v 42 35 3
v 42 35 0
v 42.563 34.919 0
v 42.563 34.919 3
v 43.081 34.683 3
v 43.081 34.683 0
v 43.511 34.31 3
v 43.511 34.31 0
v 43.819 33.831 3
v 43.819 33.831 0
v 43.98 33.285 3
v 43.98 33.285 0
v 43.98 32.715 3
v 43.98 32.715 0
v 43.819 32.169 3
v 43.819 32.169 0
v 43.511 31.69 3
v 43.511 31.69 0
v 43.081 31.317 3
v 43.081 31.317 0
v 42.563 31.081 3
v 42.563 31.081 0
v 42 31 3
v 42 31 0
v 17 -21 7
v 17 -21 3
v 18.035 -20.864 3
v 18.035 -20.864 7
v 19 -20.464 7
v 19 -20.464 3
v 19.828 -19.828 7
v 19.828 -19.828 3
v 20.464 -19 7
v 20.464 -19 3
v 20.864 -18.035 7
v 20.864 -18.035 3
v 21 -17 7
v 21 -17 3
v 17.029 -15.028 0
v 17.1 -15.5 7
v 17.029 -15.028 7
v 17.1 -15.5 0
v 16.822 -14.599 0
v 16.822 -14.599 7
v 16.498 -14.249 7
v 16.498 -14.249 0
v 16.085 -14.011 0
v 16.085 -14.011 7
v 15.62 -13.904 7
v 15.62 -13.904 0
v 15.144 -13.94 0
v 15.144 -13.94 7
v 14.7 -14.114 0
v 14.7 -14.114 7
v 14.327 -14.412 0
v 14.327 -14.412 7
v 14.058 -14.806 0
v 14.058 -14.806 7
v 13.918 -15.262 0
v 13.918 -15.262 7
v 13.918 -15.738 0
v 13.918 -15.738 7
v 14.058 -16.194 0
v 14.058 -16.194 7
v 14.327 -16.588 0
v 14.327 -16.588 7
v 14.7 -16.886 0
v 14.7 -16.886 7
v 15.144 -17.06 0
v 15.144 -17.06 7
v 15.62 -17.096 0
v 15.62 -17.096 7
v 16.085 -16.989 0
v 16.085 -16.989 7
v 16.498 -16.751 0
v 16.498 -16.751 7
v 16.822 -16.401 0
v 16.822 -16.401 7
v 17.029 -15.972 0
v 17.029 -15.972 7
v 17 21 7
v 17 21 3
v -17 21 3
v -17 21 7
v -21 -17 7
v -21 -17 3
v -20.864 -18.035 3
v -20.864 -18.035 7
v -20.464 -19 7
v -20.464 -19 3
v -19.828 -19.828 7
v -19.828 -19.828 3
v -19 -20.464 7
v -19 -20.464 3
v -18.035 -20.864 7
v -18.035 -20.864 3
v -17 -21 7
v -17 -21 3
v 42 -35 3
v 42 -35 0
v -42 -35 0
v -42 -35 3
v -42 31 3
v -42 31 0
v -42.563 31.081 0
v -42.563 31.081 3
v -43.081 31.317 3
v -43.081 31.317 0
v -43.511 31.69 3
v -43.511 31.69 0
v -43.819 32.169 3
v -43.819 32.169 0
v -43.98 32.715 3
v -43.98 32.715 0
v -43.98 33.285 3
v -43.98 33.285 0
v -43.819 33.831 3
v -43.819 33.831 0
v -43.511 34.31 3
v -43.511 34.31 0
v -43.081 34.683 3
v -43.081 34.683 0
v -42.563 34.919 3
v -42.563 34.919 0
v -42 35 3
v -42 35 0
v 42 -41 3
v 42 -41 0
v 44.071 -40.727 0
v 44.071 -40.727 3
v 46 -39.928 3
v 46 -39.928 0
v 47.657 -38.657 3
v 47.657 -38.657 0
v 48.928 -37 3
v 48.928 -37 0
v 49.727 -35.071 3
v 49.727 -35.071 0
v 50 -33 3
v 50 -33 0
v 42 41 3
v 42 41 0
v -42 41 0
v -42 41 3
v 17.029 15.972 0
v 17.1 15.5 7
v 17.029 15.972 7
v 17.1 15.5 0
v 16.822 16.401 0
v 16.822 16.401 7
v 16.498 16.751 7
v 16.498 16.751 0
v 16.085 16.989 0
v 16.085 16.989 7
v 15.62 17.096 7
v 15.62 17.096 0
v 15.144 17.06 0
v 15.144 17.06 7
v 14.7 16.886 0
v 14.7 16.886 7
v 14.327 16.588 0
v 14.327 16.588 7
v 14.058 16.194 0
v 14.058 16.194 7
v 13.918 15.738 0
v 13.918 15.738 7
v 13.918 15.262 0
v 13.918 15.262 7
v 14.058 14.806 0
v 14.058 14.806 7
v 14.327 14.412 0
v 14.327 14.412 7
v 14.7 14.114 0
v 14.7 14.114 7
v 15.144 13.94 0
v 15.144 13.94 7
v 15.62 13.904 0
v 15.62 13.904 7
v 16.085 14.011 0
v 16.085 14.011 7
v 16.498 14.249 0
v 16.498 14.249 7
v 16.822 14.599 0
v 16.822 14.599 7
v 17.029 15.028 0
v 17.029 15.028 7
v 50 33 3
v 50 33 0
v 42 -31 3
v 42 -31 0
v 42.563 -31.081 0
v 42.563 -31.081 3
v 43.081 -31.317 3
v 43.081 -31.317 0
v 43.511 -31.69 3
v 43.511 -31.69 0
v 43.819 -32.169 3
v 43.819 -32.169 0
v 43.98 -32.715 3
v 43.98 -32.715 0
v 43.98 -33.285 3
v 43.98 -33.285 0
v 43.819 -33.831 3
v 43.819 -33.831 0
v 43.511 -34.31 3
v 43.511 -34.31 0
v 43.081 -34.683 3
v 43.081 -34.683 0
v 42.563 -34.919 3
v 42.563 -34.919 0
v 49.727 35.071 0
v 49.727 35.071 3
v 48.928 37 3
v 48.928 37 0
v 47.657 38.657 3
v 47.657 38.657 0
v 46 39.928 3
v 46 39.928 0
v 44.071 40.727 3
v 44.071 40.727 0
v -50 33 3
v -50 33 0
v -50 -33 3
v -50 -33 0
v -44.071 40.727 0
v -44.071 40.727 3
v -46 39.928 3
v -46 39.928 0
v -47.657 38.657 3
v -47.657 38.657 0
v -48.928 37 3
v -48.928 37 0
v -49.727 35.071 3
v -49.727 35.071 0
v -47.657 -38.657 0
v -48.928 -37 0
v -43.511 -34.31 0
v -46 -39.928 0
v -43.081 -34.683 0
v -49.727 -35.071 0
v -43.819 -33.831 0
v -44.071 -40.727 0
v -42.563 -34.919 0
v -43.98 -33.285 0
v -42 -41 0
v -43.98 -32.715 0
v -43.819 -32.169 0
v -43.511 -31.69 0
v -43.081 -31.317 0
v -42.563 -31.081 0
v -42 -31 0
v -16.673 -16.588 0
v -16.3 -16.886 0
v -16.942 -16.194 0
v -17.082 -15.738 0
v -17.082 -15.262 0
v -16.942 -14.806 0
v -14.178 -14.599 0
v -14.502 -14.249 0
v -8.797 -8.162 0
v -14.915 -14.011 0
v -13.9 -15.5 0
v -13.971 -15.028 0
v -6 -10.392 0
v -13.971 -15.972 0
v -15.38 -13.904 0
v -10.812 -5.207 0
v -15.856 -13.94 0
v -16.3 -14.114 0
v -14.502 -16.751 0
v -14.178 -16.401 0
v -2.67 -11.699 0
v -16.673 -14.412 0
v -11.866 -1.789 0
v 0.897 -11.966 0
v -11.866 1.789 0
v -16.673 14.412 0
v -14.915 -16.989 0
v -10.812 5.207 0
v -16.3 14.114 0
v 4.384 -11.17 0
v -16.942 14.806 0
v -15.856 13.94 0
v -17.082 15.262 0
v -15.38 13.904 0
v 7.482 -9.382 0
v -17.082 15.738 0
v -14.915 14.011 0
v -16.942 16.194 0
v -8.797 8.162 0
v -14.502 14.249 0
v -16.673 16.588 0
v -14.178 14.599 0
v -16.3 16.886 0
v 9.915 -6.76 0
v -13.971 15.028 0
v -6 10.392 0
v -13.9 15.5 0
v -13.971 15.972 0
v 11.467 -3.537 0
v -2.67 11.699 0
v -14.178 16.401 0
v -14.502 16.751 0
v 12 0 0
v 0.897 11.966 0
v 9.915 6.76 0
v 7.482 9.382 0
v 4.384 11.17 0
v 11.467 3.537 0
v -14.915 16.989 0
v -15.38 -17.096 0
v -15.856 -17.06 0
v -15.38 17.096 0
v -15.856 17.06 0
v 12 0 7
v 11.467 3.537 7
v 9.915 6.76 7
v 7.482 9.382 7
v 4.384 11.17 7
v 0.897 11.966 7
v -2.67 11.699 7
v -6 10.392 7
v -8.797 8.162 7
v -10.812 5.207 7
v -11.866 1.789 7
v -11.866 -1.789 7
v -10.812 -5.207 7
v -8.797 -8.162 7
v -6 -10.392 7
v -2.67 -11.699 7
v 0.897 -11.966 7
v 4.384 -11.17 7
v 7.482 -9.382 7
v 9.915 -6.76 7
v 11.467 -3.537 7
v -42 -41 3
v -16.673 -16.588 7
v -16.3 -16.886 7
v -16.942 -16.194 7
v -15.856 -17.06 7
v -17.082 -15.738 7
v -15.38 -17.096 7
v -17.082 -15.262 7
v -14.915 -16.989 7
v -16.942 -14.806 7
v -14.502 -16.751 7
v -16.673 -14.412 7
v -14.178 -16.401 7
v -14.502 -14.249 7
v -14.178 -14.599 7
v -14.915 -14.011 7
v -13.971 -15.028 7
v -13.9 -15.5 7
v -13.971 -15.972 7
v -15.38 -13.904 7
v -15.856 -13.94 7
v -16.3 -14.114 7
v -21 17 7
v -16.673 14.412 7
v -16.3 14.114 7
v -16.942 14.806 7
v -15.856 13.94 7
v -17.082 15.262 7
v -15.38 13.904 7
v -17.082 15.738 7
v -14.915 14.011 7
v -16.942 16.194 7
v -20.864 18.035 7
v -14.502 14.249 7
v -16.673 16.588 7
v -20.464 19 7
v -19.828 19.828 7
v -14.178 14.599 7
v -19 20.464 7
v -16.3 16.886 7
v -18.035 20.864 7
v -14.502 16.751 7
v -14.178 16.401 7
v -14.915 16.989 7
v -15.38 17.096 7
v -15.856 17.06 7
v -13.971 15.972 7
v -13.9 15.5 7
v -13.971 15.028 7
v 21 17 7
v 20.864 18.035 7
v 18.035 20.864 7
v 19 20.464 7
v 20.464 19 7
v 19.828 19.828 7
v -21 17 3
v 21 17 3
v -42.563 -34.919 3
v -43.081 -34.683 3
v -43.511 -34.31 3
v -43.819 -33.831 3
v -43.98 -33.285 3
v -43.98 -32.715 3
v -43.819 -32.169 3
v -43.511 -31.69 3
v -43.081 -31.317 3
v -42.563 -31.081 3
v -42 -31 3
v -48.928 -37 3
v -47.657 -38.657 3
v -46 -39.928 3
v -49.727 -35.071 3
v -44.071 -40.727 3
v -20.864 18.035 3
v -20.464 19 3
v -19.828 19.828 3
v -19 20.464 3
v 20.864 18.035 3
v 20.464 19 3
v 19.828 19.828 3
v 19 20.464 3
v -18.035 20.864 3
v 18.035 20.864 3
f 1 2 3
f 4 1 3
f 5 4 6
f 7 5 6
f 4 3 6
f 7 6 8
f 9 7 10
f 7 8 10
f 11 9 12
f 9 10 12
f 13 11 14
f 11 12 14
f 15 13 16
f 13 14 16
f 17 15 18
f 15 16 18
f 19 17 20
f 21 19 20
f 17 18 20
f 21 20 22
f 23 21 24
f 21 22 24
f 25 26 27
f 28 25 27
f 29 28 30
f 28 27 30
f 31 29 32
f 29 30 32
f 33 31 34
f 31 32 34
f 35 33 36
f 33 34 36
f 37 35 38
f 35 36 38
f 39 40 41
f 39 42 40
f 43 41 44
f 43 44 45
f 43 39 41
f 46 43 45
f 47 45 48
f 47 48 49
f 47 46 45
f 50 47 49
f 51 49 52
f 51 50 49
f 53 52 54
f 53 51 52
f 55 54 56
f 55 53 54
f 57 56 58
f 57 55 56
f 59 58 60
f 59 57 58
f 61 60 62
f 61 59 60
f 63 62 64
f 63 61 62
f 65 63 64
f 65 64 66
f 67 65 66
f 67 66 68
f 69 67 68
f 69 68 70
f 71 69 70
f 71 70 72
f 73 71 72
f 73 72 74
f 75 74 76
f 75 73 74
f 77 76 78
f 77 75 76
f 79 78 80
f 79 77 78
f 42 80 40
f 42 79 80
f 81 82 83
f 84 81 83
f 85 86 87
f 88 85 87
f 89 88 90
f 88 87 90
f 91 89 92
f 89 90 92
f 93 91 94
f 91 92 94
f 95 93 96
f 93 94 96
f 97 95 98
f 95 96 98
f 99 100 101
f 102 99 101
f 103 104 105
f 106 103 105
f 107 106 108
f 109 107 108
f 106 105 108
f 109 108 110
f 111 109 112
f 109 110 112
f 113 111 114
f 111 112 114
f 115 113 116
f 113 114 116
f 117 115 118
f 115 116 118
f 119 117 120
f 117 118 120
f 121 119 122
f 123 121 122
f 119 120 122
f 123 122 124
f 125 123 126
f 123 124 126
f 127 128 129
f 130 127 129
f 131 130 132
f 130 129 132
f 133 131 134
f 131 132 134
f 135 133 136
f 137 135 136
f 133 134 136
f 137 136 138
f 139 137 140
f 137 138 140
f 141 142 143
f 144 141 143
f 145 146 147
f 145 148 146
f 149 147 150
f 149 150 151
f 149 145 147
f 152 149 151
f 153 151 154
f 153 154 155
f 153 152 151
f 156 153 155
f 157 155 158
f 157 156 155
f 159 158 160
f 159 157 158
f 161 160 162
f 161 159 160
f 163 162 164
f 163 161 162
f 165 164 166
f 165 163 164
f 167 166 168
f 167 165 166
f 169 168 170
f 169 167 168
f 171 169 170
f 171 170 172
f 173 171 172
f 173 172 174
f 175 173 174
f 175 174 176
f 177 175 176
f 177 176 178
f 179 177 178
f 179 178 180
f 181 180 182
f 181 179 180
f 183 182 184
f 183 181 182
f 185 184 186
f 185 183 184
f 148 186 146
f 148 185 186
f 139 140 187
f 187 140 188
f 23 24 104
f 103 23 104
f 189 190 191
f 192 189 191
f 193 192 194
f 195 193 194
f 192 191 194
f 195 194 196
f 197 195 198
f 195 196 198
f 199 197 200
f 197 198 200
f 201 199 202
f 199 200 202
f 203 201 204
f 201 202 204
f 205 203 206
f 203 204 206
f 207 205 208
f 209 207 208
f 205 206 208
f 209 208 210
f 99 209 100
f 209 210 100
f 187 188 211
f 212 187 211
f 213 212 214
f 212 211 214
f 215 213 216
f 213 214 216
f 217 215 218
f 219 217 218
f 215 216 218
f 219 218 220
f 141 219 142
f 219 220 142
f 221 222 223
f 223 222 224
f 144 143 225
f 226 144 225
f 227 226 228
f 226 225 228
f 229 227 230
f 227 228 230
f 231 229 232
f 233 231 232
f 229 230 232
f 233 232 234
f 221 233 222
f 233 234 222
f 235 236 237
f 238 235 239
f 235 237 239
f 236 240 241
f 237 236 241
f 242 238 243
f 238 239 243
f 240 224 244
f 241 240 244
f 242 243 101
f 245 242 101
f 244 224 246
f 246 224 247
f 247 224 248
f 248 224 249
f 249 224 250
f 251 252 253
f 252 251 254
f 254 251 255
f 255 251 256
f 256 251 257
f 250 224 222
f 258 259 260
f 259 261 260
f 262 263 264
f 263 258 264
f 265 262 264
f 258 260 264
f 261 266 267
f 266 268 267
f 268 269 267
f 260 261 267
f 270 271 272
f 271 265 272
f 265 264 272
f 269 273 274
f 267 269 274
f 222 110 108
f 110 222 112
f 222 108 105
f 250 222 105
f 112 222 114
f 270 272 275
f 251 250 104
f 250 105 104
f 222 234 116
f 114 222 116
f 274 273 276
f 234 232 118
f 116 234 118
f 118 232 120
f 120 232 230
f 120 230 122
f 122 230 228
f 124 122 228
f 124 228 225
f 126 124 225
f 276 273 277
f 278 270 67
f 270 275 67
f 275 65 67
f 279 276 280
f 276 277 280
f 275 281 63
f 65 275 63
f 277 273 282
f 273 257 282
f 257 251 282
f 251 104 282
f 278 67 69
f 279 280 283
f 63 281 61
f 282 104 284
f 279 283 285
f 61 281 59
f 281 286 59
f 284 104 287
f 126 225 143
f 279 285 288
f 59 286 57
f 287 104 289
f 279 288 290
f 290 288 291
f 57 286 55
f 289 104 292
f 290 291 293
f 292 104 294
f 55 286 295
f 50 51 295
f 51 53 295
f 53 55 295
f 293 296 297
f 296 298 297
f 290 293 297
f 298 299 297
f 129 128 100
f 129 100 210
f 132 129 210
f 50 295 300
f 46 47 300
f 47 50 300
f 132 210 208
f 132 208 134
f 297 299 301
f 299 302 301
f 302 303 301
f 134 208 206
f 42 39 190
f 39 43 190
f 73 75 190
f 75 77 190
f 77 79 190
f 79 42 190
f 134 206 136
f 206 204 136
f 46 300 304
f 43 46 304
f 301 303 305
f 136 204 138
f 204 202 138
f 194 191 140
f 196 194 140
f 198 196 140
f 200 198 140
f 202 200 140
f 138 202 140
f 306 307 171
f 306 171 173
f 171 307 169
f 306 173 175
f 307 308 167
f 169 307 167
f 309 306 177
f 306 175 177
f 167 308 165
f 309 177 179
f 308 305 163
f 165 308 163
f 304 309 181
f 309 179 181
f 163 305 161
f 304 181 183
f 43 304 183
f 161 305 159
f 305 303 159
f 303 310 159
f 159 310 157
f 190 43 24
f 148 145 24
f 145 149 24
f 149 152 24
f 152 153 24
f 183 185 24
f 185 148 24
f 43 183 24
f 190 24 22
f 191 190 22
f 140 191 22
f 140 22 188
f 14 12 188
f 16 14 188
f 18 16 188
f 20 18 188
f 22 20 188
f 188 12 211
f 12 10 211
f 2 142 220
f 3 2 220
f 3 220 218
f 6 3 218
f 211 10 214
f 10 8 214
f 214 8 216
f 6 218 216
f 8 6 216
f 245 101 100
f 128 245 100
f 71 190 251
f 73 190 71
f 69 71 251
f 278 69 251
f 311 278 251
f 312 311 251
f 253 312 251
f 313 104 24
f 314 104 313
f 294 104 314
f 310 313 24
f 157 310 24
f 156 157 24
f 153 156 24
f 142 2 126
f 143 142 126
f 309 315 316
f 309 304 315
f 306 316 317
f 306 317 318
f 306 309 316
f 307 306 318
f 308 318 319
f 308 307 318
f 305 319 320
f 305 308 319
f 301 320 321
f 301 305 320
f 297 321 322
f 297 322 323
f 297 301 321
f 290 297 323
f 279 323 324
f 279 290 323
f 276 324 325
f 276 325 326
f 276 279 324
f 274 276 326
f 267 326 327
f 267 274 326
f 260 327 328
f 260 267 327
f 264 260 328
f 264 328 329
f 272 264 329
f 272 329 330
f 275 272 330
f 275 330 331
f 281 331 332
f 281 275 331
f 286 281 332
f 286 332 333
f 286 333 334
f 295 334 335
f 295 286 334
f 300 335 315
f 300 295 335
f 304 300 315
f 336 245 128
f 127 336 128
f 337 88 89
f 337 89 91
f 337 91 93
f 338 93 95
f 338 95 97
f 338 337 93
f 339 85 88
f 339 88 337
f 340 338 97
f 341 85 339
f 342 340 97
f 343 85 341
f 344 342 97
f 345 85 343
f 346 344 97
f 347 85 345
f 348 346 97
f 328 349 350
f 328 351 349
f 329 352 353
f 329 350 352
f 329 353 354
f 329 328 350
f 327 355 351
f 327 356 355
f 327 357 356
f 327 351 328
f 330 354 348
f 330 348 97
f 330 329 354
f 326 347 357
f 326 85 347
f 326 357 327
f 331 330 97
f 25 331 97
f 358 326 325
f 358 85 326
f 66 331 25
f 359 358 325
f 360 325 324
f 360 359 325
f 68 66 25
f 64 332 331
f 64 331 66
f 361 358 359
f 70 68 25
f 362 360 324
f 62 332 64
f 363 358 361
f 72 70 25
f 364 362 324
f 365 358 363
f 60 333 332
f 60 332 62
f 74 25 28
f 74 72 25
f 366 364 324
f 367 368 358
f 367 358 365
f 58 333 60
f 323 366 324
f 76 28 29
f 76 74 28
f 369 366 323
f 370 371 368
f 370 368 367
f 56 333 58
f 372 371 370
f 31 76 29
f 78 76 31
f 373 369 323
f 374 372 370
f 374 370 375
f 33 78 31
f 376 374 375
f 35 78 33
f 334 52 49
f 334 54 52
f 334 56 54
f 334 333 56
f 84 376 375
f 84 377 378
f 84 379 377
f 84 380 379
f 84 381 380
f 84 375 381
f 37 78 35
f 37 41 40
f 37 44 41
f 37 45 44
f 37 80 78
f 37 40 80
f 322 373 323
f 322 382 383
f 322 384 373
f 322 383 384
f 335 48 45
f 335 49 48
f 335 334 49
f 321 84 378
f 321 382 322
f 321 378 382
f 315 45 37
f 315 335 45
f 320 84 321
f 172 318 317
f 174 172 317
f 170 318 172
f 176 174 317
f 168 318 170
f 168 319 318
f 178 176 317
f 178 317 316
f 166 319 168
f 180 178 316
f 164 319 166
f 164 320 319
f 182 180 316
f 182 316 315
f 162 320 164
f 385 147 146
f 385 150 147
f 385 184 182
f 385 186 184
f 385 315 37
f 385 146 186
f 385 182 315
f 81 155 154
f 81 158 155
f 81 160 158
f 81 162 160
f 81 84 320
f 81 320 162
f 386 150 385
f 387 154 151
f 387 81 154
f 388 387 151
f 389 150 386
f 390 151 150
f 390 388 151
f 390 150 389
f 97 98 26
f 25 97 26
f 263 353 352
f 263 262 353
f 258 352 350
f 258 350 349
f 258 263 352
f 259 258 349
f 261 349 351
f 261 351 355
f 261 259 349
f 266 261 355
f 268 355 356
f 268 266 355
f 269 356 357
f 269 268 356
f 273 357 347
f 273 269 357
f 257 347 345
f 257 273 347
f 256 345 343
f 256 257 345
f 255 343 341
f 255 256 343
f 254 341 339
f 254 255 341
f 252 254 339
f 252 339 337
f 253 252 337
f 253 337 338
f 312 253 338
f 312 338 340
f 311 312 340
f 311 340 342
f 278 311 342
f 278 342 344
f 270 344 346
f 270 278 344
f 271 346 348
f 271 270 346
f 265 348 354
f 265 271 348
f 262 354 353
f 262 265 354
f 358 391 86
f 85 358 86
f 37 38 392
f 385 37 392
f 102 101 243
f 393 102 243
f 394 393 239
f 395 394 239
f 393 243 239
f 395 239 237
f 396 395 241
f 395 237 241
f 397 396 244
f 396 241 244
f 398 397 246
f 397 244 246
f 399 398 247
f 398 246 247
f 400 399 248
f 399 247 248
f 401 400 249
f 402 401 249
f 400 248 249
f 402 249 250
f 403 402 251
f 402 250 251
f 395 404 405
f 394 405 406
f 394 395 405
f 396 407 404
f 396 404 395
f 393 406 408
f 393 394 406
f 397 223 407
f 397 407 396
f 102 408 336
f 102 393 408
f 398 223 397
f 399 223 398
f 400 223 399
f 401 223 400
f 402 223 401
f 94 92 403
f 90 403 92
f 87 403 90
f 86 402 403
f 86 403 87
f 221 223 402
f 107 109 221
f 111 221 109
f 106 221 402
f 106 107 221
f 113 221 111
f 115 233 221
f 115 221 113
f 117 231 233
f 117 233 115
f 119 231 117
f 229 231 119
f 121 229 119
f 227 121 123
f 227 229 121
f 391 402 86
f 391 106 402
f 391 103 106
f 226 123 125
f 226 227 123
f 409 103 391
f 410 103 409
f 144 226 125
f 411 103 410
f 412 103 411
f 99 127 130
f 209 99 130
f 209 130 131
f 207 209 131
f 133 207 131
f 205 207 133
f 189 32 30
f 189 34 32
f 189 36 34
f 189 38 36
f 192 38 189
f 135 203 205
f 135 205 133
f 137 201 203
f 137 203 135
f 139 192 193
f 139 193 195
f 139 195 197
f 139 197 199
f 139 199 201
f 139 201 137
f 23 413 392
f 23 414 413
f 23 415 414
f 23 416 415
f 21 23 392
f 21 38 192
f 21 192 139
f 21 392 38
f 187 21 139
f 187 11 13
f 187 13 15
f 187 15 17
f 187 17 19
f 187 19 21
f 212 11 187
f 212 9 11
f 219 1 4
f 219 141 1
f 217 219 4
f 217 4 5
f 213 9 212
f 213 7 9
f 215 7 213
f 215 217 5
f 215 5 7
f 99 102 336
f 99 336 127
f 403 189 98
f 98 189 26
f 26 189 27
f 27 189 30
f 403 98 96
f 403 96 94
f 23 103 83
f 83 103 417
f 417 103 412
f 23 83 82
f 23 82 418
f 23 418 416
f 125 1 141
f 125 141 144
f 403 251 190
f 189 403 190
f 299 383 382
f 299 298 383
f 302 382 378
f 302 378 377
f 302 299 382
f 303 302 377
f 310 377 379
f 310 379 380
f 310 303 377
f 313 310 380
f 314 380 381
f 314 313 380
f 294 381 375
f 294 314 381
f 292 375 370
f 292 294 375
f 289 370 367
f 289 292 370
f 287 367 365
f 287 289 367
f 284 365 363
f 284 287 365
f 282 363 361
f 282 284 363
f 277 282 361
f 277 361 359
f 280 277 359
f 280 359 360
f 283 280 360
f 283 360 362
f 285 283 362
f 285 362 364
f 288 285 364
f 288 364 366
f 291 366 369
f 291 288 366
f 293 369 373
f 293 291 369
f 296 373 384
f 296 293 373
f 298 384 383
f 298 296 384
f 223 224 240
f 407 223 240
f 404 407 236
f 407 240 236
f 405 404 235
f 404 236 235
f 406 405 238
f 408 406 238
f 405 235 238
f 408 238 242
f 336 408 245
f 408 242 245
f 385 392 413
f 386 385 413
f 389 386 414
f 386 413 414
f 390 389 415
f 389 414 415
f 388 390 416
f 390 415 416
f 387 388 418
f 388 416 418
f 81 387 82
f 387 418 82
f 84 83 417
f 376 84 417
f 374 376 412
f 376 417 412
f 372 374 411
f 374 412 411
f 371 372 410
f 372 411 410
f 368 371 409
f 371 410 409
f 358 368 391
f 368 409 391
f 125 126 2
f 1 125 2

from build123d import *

# Parameters (mm, degrees)
F0_R     = 1.6
F0_R_2   = 12
F1_DEPTH = 3
F2_R     = 1.6
F2_R_2   = 12
F3_DEPTH = 4


with BuildPart() as f1:
    # F0 (on Top) → F1 (new body)
    with BuildSketch(Plane.XY):
        with BuildLine():
            ThreePointArc((50, 33), (47.656854, 38.656854), (42, 41))
            Line((42, 41), (-42, 41))
            ThreePointArc((-42, 41), (-47.656854, 38.656854), (-50, 33))
            Line((-50, 33), (-50, -33))
            ThreePointArc((-50, -33), (-47.656854, -38.656854), (-42, -41))
            Line((-42, -41), (42, -41))
            ThreePointArc((42, -41), (47.656854, -38.656854), (50, -33))
            Line((50, -33), (50, 33))
        make_face()
        with Locations((-15.5, -15.5)):
            Circle(F0_R, mode=Mode.SUBTRACT)
        with BuildLine():
            Line((42, -35), (-42, -35))
            ThreePointArc((-42, -35), (-44, -33), (-42, -31))
            Line((-42, -31), (42, -31))
            ThreePointArc((42, -31), (44, -33), (42, -35))
        make_face(mode=Mode.SUBTRACT)
        with Locations((15.5, -15.5)):
            Circle(F0_R, mode=Mode.SUBTRACT)
        with Locations((-15.5, 15.5)):
            Circle(F0_R, mode=Mode.SUBTRACT)
        Circle(F0_R_2, mode=Mode.SUBTRACT)
        with Locations((15.5, 15.5)):
            Circle(F0_R, mode=Mode.SUBTRACT)
        with BuildLine():
            Line((42, 31), (-42, 31))
            ThreePointArc((-42, 31), (-44, 33), (-42, 35))
            Line((-42, 35), (42, 35))
            ThreePointArc((42, 35), (44, 33), (42, 31))
        make_face(mode=Mode.SUBTRACT)
    extrude(amount=F1_DEPTH)

    # F2 (on face) → F3 (join)
    with BuildSketch(Plane.XY.offset(3)):
        with BuildLine():
            ThreePointArc((21, 17), (19.828427, 19.828427), (17, 21))
            Line((17, 21), (-17, 21))
            ThreePointArc((-17, 21), (-19.828427, 19.828427), (-21, 17))
            Line((-21, 17), (-21, -17))
            ThreePointArc((-21, -17), (-19.828427, -19.828427), (-17, -21))
            Line((-17, -21), (17, -21))
            ThreePointArc((17, -21), (19.828427, -19.828427), (21, -17))
            Line((21, -17), (21, 17))
        make_face()
        with Locations((-15.5, -15.5)):
            Circle(F2_R, mode=Mode.SUBTRACT)
        with Locations((15.5, -15.5)):
            Circle(F2_R, mode=Mode.SUBTRACT)
        with Locations((-15.5, 15.5)):
            Circle(F2_R, mode=Mode.SUBTRACT)
        Circle(F2_R_2, mode=Mode.SUBTRACT)
        with Locations((15.5, 15.5)):
            Circle(F2_R, mode=Mode.SUBTRACT)
    extrude(amount=F3_DEPTH)


solid = f1.part
